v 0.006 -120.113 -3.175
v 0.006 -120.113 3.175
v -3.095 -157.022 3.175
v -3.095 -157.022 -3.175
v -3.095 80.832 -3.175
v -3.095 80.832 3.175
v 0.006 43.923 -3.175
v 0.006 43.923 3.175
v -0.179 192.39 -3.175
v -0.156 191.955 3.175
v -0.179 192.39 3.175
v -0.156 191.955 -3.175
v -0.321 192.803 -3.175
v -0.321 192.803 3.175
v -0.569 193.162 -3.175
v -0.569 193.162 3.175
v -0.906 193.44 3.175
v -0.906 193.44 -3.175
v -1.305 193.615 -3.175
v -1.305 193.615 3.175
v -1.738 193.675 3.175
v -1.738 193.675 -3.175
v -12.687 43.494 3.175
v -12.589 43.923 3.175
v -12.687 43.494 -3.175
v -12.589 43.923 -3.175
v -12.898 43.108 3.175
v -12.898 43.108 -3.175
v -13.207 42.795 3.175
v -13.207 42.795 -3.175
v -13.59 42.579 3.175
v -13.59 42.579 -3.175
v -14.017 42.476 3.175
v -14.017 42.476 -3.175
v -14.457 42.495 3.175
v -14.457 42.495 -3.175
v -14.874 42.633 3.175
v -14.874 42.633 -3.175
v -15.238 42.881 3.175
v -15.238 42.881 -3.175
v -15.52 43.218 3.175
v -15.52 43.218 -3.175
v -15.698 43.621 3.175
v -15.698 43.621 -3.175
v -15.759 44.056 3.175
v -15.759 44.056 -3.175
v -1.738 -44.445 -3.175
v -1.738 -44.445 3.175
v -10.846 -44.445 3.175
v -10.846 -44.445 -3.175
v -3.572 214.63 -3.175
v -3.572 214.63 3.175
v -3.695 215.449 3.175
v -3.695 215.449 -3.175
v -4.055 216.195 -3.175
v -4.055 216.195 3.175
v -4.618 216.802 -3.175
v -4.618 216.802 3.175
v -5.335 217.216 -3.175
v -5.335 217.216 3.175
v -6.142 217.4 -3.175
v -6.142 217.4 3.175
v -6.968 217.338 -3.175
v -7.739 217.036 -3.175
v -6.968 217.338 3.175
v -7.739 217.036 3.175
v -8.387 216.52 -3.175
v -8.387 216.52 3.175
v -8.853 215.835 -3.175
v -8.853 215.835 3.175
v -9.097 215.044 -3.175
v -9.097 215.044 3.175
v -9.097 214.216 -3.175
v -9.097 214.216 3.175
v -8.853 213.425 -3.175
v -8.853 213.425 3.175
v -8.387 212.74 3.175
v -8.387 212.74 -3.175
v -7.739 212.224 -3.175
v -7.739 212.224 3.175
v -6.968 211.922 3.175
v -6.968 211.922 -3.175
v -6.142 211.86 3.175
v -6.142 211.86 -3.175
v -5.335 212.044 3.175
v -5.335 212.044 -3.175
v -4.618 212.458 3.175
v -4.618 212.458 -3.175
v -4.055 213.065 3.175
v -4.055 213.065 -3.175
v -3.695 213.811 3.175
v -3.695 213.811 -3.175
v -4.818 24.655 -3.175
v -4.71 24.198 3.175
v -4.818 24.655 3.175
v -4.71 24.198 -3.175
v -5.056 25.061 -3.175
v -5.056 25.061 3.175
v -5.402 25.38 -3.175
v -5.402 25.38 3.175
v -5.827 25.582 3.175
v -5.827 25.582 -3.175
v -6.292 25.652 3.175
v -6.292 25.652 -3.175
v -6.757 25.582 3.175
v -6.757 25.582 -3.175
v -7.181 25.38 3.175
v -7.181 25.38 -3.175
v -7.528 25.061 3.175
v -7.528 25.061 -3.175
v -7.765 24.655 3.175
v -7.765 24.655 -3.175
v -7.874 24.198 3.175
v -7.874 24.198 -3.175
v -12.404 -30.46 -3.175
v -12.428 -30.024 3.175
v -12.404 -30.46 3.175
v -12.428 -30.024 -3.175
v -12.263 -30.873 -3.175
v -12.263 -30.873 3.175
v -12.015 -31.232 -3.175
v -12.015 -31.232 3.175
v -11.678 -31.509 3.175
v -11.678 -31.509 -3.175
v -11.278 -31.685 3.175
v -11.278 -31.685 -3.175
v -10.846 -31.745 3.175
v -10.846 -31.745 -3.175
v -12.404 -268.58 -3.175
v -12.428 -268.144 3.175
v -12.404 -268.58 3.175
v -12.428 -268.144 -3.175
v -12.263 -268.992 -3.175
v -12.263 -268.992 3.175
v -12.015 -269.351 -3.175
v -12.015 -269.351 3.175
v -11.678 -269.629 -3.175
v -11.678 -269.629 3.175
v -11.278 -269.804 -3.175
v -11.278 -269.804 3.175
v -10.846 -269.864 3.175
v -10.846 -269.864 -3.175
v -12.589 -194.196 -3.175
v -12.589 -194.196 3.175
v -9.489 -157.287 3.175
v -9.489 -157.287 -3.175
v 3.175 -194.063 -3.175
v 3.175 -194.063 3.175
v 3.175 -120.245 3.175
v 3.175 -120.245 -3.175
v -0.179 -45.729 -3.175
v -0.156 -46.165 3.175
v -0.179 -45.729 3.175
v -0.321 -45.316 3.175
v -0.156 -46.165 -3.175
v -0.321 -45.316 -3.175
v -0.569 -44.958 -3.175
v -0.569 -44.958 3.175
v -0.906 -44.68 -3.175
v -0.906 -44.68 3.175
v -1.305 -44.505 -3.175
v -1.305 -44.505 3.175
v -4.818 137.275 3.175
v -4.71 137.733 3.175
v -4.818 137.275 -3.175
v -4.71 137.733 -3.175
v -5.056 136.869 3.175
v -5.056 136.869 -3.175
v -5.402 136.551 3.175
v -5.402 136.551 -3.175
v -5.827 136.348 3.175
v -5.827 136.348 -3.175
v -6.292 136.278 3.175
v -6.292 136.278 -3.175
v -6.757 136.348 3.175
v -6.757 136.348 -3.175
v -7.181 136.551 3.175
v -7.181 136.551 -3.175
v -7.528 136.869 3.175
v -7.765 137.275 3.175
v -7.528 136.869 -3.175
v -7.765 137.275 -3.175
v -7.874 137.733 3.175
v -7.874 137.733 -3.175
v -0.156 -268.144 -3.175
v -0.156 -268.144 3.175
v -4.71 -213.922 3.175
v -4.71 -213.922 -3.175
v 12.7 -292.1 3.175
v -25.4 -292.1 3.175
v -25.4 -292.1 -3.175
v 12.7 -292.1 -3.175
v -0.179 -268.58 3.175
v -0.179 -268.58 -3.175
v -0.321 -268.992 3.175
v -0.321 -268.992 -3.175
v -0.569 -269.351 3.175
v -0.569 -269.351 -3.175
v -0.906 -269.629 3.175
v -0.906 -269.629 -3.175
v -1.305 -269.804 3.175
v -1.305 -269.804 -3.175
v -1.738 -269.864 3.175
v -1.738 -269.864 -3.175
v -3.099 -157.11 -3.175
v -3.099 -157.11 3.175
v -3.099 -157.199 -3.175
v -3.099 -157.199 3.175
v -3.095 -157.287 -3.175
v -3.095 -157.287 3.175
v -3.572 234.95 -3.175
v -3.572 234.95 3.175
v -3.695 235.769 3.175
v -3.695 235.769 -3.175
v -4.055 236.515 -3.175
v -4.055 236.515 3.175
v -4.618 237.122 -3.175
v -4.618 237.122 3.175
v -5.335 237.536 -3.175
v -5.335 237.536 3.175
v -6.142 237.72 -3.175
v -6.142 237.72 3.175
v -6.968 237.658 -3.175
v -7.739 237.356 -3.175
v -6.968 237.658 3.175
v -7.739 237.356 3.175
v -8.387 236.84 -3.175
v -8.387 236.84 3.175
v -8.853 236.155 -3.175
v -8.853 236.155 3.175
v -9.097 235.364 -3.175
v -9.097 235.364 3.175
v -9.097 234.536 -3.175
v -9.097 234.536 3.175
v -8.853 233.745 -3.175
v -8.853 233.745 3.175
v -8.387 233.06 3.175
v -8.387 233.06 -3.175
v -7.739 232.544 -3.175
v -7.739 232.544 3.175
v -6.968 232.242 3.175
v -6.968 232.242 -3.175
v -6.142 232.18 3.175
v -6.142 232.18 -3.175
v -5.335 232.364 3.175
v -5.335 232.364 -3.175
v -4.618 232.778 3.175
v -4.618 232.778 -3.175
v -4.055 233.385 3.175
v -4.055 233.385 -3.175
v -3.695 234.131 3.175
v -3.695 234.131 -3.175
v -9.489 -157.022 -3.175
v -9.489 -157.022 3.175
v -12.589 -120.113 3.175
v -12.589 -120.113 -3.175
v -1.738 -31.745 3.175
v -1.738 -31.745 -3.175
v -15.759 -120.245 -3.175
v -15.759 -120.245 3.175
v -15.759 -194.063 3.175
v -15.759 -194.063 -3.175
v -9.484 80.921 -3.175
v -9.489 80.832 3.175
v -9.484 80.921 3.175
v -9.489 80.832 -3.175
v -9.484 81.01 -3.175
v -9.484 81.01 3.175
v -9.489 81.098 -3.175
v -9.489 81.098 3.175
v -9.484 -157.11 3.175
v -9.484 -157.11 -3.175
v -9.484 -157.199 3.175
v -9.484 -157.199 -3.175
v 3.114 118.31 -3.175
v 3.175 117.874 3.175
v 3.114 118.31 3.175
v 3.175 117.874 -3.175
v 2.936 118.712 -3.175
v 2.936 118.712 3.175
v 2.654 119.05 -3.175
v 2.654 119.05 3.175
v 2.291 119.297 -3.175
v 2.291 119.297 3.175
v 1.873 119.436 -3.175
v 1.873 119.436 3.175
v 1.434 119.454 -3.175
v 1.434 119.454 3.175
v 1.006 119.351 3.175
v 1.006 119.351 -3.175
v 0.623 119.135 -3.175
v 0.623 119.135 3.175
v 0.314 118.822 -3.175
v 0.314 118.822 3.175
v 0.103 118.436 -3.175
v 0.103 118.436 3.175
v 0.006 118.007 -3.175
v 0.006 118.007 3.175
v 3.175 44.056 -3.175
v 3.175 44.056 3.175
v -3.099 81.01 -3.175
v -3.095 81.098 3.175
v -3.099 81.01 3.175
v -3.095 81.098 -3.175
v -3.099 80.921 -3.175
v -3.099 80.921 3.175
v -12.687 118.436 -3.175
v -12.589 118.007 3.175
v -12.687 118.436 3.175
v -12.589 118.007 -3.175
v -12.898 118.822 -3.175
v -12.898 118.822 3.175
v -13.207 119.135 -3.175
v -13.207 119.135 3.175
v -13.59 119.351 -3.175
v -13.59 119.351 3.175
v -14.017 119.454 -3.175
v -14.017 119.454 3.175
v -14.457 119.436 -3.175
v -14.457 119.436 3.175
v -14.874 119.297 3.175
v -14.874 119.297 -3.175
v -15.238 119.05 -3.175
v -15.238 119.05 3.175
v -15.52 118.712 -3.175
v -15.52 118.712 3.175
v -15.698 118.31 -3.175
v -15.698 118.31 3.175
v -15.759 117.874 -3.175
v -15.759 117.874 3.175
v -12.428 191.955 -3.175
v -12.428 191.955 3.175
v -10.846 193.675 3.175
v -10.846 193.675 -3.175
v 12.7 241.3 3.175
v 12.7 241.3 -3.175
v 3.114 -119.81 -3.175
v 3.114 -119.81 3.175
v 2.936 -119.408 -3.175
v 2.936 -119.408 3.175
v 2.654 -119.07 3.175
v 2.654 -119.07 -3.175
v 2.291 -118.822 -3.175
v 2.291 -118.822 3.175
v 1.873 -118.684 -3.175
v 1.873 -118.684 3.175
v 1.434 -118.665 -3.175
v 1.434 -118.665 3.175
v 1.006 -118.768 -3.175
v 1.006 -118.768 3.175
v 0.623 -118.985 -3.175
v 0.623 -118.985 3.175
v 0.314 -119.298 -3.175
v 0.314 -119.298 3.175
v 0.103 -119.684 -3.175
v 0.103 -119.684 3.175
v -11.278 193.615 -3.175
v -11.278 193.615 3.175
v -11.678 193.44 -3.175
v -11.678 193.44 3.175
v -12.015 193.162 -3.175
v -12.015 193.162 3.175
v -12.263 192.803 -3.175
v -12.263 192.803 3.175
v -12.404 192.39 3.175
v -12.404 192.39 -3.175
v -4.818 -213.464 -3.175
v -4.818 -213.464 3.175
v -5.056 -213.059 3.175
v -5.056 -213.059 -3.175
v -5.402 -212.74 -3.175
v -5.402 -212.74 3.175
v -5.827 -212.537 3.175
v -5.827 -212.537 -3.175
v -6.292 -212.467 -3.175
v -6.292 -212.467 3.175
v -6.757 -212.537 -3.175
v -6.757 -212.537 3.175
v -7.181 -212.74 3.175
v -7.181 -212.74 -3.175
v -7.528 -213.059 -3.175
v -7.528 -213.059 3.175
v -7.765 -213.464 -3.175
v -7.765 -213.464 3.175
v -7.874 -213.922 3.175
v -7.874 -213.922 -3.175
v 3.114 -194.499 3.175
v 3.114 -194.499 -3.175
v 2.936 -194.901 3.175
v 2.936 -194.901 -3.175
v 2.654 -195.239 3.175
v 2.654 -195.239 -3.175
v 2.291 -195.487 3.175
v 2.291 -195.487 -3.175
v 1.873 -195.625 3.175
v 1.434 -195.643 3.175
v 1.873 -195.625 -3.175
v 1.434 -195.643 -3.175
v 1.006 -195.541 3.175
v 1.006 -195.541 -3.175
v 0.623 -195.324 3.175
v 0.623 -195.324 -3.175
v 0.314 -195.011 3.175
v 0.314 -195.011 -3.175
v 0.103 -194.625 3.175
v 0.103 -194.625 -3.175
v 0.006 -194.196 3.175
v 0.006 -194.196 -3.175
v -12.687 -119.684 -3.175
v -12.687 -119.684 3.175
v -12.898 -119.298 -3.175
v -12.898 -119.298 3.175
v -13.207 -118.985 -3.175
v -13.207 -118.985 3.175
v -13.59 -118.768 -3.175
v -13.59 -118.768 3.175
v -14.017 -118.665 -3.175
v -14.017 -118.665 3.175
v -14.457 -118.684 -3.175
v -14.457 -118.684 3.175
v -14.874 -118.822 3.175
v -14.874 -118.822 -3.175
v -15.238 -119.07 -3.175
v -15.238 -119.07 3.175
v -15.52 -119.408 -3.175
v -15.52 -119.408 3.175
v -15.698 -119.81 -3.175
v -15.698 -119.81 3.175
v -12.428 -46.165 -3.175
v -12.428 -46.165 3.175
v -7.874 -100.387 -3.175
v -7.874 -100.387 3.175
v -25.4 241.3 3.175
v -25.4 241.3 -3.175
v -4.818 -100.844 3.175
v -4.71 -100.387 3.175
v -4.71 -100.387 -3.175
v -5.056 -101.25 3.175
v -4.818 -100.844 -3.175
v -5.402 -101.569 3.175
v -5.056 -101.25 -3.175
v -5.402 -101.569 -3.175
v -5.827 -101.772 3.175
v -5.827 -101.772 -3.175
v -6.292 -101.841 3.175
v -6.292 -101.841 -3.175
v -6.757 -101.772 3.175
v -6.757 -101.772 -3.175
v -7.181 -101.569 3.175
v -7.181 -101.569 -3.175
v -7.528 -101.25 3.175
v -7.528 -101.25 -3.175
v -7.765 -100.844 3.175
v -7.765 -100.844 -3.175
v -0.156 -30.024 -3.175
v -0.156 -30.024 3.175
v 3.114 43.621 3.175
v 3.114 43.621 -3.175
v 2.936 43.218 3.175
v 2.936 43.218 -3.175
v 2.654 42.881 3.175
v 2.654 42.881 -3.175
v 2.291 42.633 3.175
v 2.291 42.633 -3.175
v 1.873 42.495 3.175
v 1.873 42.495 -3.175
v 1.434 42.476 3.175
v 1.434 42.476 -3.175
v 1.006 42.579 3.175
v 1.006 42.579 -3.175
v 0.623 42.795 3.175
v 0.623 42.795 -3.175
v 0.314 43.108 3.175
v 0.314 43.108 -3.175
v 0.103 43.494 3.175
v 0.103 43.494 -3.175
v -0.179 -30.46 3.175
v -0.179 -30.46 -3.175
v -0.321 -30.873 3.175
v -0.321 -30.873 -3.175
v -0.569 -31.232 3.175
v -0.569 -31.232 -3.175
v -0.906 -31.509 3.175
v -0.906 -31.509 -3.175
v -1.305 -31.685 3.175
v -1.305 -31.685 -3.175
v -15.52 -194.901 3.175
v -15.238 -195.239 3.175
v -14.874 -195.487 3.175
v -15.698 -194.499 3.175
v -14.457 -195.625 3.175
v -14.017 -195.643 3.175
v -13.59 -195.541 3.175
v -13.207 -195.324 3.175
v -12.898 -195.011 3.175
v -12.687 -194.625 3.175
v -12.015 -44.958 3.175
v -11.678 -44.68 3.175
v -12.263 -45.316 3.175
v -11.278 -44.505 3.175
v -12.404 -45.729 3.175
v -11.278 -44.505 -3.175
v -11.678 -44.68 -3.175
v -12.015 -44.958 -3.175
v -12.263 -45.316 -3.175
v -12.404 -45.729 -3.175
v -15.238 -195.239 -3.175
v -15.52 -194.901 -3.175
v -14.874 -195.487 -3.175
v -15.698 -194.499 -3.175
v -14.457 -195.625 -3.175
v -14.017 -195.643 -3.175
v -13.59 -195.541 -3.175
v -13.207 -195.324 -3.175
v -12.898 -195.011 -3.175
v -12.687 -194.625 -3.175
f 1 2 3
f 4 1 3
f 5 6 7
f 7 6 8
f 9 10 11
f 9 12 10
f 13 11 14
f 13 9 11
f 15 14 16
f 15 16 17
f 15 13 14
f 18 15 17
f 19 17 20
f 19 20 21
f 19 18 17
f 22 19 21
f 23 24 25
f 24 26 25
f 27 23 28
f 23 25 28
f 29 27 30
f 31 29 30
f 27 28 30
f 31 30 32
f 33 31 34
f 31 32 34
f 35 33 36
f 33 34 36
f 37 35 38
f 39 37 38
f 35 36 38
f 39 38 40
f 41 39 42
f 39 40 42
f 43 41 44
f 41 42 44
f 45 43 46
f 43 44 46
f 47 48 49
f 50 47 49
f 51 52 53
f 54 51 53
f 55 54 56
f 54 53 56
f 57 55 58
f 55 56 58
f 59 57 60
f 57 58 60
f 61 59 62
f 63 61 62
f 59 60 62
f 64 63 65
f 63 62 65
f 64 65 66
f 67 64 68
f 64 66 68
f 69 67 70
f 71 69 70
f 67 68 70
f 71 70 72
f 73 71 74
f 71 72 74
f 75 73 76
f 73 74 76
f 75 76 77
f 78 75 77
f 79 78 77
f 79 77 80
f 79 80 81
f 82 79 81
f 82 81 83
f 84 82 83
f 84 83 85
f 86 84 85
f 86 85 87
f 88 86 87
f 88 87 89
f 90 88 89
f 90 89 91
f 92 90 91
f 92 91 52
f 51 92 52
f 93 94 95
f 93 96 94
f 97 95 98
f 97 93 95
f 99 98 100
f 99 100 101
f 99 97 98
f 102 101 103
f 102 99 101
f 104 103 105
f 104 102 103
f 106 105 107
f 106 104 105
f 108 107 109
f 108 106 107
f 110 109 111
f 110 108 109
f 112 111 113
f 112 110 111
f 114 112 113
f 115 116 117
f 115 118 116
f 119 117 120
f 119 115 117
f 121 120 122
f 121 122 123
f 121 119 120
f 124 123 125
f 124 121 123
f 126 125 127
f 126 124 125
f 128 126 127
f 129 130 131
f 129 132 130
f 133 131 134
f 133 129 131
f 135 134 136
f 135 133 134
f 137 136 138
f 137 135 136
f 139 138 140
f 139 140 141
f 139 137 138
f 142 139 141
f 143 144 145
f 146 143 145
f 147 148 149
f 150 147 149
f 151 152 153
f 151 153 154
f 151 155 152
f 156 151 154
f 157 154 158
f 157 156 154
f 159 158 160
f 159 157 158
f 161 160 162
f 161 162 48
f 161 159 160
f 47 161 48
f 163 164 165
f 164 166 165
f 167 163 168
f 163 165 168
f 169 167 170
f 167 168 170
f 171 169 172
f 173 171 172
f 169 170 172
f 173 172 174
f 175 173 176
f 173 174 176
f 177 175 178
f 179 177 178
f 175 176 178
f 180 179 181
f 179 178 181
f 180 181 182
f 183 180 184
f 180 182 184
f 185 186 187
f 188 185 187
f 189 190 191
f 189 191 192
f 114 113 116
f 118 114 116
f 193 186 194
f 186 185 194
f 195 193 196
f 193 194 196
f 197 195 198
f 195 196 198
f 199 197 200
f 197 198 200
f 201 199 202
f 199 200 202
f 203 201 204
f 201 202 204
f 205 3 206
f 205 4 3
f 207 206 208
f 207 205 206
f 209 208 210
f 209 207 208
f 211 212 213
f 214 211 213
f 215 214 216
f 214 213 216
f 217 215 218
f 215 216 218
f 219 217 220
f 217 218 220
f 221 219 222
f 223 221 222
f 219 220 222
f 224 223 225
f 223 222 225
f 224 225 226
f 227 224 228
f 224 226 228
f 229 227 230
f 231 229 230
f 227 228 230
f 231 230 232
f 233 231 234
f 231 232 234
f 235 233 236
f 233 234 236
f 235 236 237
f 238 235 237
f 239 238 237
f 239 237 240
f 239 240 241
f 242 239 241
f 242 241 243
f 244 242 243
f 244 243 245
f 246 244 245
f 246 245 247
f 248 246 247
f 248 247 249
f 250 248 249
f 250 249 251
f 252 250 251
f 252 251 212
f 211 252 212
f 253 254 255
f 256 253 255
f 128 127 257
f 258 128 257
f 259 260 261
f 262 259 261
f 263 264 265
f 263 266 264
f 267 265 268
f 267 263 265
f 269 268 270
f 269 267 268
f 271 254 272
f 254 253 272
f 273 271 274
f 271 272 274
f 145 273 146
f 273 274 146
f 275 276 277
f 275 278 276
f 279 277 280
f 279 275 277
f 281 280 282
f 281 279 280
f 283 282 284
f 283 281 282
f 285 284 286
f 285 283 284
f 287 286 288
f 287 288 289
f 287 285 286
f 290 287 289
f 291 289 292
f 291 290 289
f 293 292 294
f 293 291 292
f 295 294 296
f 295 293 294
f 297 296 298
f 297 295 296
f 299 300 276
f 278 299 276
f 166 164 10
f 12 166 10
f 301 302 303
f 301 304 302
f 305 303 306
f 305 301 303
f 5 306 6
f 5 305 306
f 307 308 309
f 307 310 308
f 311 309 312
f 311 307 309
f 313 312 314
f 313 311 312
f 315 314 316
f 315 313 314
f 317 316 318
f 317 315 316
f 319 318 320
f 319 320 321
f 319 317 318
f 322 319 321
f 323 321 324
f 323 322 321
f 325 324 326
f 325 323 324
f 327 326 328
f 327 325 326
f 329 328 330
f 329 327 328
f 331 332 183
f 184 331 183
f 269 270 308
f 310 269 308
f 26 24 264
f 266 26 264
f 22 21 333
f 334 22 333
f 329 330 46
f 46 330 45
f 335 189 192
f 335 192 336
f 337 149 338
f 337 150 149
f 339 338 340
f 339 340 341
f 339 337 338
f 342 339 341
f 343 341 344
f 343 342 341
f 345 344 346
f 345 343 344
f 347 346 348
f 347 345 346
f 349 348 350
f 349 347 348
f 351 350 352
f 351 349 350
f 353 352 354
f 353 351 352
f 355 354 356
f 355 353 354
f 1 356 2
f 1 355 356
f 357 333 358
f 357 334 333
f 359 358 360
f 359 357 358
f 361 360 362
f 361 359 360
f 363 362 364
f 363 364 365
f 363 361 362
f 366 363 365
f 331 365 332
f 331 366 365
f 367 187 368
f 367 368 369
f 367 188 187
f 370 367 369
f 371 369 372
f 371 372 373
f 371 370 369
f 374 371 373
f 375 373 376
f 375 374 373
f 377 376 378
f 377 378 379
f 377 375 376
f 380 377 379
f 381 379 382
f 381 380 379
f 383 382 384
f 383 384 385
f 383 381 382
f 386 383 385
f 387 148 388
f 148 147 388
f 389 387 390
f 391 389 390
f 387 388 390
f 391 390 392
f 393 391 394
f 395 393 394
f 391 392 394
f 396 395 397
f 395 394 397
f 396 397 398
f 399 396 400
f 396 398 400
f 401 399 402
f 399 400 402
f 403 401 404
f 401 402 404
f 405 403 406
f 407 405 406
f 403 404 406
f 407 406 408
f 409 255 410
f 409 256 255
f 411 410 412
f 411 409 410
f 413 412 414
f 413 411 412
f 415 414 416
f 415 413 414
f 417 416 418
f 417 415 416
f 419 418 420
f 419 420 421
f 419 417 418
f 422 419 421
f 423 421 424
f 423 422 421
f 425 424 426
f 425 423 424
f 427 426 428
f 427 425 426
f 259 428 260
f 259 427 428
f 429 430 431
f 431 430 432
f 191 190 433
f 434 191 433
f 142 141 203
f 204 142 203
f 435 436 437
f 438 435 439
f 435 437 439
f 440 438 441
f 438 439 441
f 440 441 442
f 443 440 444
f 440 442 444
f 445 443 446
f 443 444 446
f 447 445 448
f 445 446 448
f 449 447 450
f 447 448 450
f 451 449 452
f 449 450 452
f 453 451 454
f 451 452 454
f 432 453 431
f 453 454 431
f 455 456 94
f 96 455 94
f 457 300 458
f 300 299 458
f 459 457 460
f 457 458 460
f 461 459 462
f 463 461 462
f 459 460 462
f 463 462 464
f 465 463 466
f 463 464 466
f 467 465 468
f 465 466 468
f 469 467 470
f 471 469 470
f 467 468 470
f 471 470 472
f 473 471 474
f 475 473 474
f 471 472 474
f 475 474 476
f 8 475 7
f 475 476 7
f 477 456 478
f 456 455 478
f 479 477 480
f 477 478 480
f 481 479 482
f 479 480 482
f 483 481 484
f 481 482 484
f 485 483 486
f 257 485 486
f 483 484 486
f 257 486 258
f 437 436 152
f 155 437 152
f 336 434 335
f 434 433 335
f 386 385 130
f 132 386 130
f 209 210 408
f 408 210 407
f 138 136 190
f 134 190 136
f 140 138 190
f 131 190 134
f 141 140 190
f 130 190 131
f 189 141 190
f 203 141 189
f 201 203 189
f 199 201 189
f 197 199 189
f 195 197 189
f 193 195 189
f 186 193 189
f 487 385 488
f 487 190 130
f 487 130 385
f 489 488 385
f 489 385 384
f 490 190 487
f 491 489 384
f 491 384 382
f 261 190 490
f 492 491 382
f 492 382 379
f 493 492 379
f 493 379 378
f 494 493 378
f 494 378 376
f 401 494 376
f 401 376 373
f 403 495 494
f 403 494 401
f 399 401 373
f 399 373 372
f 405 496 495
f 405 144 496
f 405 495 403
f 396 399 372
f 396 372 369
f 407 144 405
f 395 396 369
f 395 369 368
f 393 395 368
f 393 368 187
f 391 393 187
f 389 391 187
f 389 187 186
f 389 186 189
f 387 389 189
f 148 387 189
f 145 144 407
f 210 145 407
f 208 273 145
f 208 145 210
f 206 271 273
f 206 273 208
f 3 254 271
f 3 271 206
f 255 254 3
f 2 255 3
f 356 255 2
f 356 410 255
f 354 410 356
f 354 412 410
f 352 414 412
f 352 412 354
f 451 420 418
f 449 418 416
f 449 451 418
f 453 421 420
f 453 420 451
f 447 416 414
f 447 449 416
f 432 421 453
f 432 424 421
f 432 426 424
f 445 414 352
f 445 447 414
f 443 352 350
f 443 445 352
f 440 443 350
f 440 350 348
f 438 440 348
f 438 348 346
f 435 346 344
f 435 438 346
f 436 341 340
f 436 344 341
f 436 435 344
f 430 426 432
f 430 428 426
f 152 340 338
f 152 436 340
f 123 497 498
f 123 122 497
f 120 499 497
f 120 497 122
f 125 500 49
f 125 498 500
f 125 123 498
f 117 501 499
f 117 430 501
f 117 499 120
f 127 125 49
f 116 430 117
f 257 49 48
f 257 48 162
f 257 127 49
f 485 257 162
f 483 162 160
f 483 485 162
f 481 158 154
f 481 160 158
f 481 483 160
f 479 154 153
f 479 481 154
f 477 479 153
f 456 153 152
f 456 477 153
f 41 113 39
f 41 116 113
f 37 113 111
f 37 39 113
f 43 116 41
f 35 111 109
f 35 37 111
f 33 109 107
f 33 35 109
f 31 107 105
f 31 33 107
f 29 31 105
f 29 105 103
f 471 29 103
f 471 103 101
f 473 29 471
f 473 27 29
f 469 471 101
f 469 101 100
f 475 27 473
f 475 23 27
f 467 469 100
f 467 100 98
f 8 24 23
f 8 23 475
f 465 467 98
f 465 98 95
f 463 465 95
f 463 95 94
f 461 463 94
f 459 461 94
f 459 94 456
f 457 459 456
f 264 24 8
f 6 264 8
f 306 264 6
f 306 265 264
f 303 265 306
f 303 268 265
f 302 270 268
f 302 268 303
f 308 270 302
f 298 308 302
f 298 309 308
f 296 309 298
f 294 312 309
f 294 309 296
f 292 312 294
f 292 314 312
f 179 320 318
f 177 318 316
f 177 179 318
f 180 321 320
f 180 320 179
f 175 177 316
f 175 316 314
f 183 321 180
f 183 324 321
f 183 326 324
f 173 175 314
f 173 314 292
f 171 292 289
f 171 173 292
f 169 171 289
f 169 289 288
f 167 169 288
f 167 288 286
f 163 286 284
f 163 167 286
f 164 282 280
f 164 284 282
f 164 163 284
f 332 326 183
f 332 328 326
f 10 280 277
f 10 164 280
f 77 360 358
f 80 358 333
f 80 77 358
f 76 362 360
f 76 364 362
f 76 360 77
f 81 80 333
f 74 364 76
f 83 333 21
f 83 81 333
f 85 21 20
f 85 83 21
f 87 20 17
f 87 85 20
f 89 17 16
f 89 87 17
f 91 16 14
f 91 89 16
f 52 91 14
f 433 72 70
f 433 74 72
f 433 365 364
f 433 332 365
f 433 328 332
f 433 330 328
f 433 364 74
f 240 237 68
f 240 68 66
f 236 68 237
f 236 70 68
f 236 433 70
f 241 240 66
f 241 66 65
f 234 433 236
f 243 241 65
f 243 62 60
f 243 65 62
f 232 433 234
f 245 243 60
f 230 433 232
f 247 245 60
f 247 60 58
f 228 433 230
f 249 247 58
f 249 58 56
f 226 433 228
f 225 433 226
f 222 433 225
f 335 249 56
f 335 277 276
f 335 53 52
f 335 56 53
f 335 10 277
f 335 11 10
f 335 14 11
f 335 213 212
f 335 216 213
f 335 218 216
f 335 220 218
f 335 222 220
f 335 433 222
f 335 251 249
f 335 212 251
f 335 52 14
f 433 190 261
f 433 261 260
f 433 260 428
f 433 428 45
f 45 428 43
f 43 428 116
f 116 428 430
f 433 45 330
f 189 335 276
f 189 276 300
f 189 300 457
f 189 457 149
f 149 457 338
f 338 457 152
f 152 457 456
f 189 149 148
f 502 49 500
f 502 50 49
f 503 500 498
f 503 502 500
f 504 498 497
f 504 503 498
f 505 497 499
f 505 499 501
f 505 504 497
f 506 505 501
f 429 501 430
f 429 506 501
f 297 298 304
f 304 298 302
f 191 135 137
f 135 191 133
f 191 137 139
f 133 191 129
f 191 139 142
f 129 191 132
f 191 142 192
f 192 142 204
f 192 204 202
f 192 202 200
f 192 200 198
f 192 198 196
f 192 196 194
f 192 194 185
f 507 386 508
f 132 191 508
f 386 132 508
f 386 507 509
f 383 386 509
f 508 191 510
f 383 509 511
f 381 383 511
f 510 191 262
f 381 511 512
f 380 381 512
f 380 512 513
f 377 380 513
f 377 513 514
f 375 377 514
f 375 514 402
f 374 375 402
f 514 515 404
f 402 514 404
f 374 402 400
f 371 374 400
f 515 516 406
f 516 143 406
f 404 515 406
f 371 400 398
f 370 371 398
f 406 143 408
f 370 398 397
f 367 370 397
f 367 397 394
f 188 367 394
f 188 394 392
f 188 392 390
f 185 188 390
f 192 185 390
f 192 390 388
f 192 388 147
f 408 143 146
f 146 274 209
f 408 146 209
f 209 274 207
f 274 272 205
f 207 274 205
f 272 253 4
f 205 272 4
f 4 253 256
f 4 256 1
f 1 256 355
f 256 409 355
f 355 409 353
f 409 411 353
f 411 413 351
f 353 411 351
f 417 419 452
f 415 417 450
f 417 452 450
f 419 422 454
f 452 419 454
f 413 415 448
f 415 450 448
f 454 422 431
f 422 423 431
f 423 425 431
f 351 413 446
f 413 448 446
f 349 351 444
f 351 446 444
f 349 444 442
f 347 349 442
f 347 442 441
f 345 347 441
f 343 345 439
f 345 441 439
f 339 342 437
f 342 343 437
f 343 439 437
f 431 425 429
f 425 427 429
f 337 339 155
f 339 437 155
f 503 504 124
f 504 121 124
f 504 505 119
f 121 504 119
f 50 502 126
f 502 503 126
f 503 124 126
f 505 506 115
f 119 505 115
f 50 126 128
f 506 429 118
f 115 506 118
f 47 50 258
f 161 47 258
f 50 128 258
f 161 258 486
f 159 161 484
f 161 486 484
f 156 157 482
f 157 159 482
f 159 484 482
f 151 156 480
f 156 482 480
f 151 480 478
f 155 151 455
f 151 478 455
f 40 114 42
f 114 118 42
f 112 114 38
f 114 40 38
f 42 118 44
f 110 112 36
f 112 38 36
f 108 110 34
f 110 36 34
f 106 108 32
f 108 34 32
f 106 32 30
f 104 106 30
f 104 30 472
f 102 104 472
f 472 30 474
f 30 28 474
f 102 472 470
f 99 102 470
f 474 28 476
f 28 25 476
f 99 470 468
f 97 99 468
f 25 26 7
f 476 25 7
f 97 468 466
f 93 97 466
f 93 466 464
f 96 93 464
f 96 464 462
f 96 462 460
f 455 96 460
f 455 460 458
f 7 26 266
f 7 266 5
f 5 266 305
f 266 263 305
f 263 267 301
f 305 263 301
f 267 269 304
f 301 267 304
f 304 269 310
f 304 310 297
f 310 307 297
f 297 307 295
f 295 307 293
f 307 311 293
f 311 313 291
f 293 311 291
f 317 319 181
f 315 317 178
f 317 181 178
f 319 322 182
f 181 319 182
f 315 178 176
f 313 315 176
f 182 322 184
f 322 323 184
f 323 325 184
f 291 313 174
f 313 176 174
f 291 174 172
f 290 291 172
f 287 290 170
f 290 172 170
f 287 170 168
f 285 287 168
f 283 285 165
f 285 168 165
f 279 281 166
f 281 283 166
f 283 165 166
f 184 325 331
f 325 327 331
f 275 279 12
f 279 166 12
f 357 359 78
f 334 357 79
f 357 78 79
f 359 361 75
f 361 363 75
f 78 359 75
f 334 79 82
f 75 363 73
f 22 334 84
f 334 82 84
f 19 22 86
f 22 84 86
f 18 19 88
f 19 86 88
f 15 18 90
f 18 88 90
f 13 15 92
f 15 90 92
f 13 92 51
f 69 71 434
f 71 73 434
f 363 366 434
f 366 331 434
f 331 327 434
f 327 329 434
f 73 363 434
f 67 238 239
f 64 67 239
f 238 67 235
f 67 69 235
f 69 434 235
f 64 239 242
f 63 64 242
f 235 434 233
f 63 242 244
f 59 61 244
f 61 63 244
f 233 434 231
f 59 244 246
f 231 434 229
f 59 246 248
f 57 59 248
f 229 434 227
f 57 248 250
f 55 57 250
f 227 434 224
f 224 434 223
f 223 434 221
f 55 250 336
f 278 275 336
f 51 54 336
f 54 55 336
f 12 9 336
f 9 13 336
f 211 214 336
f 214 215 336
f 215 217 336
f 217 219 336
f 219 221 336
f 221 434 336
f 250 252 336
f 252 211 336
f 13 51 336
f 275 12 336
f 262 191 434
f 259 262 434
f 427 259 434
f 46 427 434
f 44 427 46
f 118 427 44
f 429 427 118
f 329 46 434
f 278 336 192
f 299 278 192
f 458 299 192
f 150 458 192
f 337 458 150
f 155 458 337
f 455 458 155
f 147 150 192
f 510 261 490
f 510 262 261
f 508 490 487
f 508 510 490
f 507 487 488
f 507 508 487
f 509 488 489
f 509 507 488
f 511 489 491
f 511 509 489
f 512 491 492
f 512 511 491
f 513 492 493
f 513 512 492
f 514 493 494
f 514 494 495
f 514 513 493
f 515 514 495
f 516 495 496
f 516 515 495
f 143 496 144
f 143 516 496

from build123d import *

# Parameters (mm, degrees)
SKETCH1_W           = 38.1
SKETCH1_H           = 533.4
BOSS_EXTRUDE1_DEPTH = 3.175
SKETCH2_R           = 2.778125
CUT_EXTRUDE1_DEPTH  = 294.271022264
CUT_EXTRUDE2_DEPTH  = 294.271022264
FILLET1_R           = 1.5875


with BuildPart() as part:
    # Sketch1 → Boss-Extrude1 (new, symmetric)
    with BuildSketch(Plane.XY):
        with Locations((-6.35, -25.4)):
            Rectangle(SKETCH1_W, SKETCH1_H)
    extrude(amount=BOSS_EXTRUDE1_DEPTH, both=True)

    # Sketch2 → Cut-Extrude1 (cut, through all)
    with BuildSketch(Plane.XY.offset(3.175)):
        with Locations((-6.35, 234.95)):
            Circle(SKETCH2_R)
        with Locations((-6.35, 214.63)):
            Circle(SKETCH2_R)
    extrude(amount=-CUT_EXTRUDE1_DEPTH, mode=Mode.SUBTRACT)

    # Sketch3 → Cut-Extrude2 (cut, through all)
    with BuildSketch(Plane.XY.offset(3.175)):
        Polygon((-6.291879002, 118.898888525), (-0.011179953, 193.675), (-12.57257805, 193.675), align=None)
        Polygon((3.175, 6.189078026), (3.175, 155.741300976), (-3.105699049, 80.965189501), align=None)
        Polygon((-15.758758004, 6.189078026), (-9.478058955, 80.965189501), (-15.758758004, 155.741300976), align=None)
        Polygon((-0.011179953, -31.744620998), (-6.291879002, 43.031490477), (-12.57257805, -31.744620998), align=None)
        Polygon((-6.291879002, -119.220732473), (-0.011179953, -44.444620998), (-12.57257805, -44.444620998), align=None)
        Polygon((3.175, -231.930542972), (3.175, -82.378320022), (-3.105699049, -157.154431497), align=None)
        Polygon((-9.478058955, -157.154431497), (-15.758758004, -82.378320022), (-15.758758004, -231.930542972), align=None)
        Polygon((-0.011179953, -269.864241996), (-6.291879002, -195.088130521), (-12.57257805, -269.864241996), align=None)
    extrude(amount=-CUT_EXTRUDE2_DEPTH, mode=Mode.SUBTRACT)

    # Fillet1
    fillet1_edges = [part.edges().sort_by_distance(p)[0] for p in [
        (-6.291879002, -119.220732473, 0),
        (-12.57257805, -44.444620998, 0),
        (-0.011179953, -44.444620998, 0),
        (-6.291879002, 43.031490477, 0),
        (-0.011179953, -31.744620998, 0),
        (-12.57257805, -31.744620998, 0),
        (-15.758758004, 155.741300976, 0),
        (-9.478058955, 80.965189501, 0),
        (-15.758758004, 6.189078026, 0),
        (-3.105699049, 80.965189501, 0),
        (3.175, 155.741300976, 0),
        (3.175, 6.189078026, 0),
        (-12.57257805, -269.864241996, 0),
        (-6.291879002, -195.088130521, 0),
        (-0.011179953, -269.864241996, 0),
        (-15.758758004, -231.930542972, 0),
        (-15.758758004, -82.378320022, 0),
        (-9.478058955, -157.154431497, 0),
        (-3.105699049, -157.154431497, 0),
        (3.175, -82.378320022, 0),
        (3.175, -231.930542972, 0),
        (-12.57257805, 193.675, 0),
        (-0.011179953, 193.675, 0),
        (-6.291879002, 118.898888525, 0),
    ]]
    fillet(fillet1_edges, radius=FILLET1_R)


solid = part.part
